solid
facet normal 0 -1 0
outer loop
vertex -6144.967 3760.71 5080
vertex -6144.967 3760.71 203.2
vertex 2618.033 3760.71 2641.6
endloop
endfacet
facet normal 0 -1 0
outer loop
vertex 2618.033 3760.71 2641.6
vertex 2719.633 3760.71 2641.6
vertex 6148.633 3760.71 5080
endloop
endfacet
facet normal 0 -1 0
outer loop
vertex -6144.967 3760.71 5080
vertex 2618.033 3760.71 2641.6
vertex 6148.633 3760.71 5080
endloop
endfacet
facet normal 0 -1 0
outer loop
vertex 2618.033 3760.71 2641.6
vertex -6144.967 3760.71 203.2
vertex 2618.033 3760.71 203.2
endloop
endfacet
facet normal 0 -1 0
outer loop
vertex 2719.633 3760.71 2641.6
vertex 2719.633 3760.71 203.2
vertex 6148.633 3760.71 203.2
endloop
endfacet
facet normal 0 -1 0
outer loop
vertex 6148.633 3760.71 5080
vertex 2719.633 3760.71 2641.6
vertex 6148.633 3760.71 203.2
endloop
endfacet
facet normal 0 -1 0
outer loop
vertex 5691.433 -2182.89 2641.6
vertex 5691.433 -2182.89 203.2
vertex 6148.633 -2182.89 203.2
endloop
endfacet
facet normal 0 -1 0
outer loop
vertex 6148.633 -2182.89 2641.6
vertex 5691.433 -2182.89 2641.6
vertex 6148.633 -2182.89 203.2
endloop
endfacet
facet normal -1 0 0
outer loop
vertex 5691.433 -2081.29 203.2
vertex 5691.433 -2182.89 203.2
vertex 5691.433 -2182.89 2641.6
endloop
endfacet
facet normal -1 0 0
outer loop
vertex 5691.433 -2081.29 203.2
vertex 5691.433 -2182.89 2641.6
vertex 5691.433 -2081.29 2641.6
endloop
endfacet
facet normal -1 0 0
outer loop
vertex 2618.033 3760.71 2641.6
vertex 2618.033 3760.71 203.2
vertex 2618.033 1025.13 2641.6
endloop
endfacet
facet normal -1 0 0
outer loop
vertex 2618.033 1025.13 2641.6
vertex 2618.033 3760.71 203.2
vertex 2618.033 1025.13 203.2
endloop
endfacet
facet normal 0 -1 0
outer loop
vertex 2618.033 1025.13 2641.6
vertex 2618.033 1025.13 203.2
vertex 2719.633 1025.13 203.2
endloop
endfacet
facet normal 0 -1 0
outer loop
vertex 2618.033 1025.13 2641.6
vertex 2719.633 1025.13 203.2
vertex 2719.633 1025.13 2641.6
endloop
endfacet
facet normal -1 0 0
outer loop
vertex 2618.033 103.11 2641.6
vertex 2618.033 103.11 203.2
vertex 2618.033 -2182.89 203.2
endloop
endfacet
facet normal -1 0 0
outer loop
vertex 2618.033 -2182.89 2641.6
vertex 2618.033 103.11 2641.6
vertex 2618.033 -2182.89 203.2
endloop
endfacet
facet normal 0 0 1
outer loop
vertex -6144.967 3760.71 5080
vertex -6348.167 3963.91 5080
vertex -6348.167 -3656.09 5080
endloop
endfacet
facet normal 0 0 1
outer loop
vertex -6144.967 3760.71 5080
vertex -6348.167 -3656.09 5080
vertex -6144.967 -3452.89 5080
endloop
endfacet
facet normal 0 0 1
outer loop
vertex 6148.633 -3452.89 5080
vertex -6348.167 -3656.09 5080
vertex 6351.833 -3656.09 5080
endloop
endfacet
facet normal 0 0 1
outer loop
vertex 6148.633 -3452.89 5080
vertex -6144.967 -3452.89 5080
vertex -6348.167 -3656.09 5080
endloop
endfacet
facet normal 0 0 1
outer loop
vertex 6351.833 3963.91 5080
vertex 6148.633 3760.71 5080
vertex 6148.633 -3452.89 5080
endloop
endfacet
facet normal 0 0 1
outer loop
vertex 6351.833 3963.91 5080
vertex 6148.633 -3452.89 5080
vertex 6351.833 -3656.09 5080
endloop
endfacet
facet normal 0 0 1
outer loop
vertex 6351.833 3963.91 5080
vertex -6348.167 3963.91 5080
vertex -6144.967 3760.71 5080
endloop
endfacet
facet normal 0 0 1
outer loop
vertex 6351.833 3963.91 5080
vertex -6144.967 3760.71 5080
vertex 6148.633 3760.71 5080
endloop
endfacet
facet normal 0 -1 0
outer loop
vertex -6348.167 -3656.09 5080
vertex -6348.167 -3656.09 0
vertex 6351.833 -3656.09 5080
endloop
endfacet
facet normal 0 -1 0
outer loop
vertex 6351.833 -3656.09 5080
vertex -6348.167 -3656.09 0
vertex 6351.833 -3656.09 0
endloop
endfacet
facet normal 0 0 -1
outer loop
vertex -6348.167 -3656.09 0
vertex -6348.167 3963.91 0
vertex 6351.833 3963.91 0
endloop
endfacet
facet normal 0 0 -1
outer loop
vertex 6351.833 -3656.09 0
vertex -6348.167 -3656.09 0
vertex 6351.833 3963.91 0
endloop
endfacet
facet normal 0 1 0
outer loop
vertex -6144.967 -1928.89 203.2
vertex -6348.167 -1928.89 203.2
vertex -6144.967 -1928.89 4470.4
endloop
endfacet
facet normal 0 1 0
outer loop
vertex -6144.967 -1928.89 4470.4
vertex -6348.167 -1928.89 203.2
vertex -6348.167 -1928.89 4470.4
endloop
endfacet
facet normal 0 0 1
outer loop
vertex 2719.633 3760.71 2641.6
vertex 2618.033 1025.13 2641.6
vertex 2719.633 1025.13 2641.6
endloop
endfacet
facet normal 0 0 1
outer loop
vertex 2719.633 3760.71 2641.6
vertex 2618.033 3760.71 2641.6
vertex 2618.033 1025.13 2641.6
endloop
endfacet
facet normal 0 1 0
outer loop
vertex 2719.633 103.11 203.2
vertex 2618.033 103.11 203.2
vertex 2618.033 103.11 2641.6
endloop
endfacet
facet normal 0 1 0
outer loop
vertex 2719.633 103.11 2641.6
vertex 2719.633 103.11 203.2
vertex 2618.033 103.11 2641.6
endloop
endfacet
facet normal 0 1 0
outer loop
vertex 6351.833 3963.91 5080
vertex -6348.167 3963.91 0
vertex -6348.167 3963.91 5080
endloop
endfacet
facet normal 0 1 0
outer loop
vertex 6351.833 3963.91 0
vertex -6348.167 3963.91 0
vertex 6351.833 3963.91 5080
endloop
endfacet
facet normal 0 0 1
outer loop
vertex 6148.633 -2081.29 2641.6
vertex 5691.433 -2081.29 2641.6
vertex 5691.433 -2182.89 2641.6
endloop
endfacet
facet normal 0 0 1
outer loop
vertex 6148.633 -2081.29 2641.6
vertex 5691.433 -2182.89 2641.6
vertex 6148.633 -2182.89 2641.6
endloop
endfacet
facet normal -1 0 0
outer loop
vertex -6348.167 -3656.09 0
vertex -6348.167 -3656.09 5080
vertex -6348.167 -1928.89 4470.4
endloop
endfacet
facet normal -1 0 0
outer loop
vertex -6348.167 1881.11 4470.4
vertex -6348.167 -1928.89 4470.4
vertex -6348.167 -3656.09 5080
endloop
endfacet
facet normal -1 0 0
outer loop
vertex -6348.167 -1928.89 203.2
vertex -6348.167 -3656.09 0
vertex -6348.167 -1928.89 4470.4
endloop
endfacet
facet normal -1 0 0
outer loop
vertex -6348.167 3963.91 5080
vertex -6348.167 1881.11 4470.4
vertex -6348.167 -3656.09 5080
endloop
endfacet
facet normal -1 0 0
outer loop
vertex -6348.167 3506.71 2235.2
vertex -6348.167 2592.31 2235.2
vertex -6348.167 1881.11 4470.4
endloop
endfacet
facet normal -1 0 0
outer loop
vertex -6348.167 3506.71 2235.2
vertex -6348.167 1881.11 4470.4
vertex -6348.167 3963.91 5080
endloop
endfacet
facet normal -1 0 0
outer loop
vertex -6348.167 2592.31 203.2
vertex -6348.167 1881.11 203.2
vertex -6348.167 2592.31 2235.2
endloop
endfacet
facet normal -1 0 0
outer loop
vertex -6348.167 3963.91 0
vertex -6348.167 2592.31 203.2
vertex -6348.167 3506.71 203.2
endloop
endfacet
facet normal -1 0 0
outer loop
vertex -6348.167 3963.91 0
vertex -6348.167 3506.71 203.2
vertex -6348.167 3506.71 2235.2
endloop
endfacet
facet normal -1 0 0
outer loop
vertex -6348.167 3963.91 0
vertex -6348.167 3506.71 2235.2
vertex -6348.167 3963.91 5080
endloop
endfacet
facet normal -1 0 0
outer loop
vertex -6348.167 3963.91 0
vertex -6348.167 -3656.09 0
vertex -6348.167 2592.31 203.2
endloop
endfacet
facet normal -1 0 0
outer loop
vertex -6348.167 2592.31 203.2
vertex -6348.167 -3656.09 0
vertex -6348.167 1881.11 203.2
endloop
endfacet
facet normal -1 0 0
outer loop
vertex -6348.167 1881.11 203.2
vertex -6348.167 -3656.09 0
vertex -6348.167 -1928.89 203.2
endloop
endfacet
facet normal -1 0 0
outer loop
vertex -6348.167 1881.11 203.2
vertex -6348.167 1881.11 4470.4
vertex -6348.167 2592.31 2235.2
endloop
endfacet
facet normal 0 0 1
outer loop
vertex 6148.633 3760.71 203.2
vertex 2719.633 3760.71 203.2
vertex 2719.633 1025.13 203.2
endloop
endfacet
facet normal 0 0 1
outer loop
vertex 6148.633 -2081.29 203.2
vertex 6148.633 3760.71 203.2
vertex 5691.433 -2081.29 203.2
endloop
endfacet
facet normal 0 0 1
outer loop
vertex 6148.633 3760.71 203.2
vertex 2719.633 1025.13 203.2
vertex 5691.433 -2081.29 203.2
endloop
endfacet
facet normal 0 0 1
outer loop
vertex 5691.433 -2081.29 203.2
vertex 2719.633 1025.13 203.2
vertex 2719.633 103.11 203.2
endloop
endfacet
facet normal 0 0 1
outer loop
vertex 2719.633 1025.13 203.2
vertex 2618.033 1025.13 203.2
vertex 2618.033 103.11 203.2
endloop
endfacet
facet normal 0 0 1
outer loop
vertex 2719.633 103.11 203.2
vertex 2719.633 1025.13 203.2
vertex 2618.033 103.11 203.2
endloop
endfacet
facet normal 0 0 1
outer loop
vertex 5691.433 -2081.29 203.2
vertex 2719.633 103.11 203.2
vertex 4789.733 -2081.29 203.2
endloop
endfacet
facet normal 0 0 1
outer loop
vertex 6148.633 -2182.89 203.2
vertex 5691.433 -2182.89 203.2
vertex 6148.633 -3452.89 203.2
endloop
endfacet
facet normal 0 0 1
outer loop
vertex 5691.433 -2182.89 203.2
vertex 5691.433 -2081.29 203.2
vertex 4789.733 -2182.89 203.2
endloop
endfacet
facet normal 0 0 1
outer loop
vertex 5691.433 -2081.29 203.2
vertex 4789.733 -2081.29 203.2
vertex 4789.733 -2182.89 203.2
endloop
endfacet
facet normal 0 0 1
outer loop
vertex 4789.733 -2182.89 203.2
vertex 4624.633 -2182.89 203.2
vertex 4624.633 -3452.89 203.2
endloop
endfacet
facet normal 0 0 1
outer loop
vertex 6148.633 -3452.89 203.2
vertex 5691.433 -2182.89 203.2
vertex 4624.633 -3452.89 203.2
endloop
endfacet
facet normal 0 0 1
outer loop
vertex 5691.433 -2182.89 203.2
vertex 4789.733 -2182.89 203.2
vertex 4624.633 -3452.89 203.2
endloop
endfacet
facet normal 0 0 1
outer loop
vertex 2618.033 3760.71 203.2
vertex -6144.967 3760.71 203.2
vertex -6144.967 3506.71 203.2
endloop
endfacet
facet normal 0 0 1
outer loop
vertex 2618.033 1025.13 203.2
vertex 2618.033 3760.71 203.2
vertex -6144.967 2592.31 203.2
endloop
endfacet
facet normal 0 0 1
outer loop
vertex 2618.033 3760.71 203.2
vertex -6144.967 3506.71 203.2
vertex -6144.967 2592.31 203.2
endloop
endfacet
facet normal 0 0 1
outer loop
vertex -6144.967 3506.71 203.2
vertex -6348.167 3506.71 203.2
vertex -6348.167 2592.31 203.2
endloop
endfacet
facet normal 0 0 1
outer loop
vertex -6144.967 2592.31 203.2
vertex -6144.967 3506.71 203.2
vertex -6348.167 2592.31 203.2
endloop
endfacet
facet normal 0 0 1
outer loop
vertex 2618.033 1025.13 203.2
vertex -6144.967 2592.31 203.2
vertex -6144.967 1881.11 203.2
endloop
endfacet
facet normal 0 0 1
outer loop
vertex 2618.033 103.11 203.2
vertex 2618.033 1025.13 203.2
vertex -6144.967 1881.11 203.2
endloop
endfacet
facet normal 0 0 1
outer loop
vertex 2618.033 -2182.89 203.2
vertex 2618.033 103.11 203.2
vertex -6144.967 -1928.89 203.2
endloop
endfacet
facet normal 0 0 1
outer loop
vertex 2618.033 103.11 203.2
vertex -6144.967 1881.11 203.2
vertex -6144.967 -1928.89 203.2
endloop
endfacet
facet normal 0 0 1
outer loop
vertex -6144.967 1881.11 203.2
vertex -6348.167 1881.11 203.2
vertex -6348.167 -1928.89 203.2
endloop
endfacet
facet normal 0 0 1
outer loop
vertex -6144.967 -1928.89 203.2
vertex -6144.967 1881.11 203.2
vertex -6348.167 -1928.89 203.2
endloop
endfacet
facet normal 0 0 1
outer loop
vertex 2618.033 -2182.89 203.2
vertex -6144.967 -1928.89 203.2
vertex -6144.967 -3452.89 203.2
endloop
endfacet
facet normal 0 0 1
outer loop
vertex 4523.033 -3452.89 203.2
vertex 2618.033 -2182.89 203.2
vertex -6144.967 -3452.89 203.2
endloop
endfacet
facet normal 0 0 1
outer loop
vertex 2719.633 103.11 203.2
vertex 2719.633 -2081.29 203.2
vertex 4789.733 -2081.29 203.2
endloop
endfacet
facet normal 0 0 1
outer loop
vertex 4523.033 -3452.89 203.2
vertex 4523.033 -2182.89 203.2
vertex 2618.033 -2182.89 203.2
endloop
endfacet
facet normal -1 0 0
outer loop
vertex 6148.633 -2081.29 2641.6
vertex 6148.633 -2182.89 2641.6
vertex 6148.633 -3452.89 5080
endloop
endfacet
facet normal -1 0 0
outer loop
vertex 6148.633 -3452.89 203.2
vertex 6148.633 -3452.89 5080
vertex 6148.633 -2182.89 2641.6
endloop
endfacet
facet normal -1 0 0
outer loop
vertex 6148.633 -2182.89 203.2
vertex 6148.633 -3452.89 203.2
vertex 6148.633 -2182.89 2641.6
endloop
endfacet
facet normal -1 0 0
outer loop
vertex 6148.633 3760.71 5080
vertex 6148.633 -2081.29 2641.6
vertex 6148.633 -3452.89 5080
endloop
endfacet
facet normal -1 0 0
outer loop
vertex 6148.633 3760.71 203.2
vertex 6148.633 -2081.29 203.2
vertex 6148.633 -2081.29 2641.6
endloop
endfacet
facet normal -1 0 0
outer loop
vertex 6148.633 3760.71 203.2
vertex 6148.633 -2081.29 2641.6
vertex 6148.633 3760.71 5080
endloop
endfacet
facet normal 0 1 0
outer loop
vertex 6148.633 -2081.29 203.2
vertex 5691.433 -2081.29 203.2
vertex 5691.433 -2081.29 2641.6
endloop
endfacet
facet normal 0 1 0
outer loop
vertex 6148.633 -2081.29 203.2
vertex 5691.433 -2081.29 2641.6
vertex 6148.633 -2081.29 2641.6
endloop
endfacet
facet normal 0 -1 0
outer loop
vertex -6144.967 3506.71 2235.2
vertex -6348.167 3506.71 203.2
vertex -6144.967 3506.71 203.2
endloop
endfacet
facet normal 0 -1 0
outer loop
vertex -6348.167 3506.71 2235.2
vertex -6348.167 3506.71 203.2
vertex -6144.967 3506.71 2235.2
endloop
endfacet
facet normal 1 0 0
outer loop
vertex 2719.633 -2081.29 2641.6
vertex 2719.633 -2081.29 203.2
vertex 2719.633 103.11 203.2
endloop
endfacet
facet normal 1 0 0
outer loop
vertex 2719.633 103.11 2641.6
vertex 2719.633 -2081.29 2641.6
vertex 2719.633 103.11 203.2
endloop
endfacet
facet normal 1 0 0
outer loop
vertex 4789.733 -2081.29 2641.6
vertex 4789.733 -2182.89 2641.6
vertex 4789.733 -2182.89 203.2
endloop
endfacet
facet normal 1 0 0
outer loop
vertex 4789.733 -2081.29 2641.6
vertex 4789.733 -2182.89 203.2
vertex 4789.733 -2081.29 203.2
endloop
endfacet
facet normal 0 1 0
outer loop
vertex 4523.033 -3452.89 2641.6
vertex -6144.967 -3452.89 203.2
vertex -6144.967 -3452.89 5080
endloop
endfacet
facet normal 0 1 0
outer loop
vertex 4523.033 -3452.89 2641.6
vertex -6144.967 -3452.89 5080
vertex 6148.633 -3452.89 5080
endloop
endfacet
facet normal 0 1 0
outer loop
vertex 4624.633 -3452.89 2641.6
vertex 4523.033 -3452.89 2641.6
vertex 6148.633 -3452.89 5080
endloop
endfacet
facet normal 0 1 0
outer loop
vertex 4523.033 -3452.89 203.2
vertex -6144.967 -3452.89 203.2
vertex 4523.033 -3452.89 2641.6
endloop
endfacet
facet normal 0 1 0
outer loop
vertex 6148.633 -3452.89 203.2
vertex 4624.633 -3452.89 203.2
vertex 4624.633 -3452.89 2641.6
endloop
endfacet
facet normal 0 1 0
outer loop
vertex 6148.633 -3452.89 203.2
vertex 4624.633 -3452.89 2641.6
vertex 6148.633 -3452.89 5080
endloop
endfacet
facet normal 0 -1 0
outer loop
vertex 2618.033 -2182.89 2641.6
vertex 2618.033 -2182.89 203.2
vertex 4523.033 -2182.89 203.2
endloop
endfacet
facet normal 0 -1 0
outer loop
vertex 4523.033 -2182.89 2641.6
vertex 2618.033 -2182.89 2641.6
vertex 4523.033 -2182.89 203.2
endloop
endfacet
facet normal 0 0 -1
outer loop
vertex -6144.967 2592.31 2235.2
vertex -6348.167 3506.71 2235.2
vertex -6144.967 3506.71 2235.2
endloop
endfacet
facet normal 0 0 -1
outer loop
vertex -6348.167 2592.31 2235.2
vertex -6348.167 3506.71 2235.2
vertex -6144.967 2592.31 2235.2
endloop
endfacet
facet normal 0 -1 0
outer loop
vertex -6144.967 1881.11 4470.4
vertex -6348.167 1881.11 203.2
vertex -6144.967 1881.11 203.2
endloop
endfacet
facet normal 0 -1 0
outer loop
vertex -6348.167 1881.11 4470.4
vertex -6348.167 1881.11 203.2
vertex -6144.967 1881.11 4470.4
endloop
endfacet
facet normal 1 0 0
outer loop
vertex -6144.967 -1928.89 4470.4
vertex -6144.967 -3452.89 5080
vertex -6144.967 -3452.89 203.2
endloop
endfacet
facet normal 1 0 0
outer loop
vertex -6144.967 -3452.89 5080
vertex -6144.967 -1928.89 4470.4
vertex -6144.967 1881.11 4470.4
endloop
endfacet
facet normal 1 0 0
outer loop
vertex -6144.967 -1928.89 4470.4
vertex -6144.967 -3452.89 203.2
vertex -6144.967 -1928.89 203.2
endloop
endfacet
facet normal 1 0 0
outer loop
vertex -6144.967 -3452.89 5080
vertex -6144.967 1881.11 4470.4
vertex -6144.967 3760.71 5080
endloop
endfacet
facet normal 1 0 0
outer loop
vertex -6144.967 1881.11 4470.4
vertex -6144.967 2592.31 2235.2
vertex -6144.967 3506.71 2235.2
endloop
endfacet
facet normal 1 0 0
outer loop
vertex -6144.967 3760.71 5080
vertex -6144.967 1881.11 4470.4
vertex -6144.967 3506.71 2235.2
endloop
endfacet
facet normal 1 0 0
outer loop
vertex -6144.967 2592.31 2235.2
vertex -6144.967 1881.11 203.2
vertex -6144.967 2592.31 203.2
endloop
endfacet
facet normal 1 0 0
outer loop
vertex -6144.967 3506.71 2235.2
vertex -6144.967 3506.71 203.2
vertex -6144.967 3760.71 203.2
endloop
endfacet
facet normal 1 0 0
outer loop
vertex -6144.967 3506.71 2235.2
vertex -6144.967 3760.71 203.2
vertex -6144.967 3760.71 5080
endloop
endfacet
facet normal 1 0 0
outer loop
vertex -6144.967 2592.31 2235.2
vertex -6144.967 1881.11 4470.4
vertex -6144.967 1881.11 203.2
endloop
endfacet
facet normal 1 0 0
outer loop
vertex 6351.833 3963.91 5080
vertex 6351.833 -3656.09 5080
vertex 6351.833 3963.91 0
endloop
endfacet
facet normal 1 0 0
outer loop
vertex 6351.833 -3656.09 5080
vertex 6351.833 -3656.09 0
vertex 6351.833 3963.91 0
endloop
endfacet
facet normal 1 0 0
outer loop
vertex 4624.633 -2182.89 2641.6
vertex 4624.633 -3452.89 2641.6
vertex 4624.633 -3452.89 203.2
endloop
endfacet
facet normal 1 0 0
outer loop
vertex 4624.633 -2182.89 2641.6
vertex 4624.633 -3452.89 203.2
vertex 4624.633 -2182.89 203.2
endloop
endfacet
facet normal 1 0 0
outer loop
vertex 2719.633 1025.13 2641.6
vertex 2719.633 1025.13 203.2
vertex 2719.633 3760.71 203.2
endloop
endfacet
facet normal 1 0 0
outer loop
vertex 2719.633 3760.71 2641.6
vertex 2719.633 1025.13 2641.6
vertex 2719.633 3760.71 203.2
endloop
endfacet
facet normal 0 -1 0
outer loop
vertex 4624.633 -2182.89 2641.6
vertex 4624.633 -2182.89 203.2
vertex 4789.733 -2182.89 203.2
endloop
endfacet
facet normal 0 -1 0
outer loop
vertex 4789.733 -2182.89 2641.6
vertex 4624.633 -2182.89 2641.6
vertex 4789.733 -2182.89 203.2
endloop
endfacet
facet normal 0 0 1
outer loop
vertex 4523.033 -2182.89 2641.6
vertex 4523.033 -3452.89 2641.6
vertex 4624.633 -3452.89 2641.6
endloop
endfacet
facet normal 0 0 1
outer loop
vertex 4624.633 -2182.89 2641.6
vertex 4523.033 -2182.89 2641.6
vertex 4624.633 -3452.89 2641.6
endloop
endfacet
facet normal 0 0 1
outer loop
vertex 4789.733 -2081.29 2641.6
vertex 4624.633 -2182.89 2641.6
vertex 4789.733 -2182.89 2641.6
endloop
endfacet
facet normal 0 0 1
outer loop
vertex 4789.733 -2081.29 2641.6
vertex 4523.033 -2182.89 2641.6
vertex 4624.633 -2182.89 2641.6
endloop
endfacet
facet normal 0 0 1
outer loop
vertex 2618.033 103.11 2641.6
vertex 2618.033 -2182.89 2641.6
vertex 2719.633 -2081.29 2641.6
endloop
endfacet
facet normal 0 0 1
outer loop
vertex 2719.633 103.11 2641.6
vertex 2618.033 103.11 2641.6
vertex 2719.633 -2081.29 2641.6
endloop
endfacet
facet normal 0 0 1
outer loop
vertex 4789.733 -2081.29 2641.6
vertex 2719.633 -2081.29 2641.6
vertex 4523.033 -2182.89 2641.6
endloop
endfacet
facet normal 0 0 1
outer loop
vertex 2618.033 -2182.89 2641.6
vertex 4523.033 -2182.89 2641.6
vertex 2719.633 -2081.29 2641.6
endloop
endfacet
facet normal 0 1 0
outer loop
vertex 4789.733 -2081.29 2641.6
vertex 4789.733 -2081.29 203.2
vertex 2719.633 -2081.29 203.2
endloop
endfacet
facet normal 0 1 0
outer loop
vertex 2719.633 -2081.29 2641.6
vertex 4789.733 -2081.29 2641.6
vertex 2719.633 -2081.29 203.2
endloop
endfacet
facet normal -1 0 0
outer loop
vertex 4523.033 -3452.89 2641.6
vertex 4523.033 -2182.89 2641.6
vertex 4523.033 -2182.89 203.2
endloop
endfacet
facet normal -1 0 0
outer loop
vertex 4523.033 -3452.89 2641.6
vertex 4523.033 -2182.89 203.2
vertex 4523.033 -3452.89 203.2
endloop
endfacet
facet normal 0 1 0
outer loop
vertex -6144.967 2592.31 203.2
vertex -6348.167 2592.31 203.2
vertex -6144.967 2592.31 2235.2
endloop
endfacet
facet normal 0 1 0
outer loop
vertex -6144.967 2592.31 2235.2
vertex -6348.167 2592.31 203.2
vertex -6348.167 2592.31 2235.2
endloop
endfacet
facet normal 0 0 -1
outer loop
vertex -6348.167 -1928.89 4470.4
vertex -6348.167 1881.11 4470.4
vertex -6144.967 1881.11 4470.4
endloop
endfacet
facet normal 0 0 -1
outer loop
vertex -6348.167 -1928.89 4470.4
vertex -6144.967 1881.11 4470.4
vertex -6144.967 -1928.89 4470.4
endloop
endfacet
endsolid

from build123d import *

# Parameters (mm, degrees)
F3_W      = 12700
F3_H      = 7620
F4_DEPTH  = 203.2
F5_W      = 12700
F5_H      = 7620
F5_W_2    = 12293.6
F5_H_2    = 7213.6
F6_DEPTH  = 4876.8
F7_W      = 3810
F7_H      = 4267.2
F7_W_2    = 914.4
F7_H_2    = 2032
F8_DEPTH  = 203.2
F9_W      = 457.2
F9_H      = 101.6
F10_DEPTH = 2438.4
F11_W     = 922.02
F11_H     = 2438.4
F12_DEPTH = 101.6


# Not quite as in the source:
# - a variable given as a bare number and used for a length is read in inches; the dataset says mm whatever the document's units were


with BuildPart() as f4:
    # F3 (on Top) → F4 (new body)
    with BuildSketch(Plane.XY):
        with Locations((1.8329881132, 153.9102016476)):
            Rectangle(F3_W, F3_H)
    extrude(amount=F4_DEPTH)

    # F5 (on face) → F6 (join)
    with BuildSketch(Plane.XY.offset(203.2)):
        with Locations((1.8329881132, 153.9102016476)):
            Rectangle(F5_W, F5_H)
        with Locations((1.8329881132, 153.9102016476)):
            Rectangle(F5_W_2, F5_H_2, mode=Mode.SUBTRACT)
    extrude(amount=F6_DEPTH)

    # F7 (on face) → F8 (cut, through all)
    with BuildSketch(Plane(origin=(-6348.1670118868, 0, 0), x_dir=(0, -1, 0), z_dir=(-1, 0, 0))):
        with Locations((23.8897983524, 2336.8)):
            Rectangle(F7_W, F7_H)
        with Locations((-3049.5102016476, 1219.2)):
            Rectangle(F7_W_2, F7_H_2)
    extrude(amount=-F8_DEPTH, mode=Mode.SUBTRACT)

    # F9 (on face) → F10 (join)
    with BuildSketch(Plane.XY.offset(203.2)):
        Polygon((2719.6329881132, -2081.2897983524), (2719.6329881132, 3760.7102016476), (2618.0329881132, 3760.7102016476), (2618.0329881132, -2182.8897983524), (4523.0329881132, -2182.8897983524), (4523.0329881132, -3452.8897983524), (4624.6329881132, -3452.8897983524), (4624.6329881132, -2182.8897983524), (4789.7329881132, -2182.8897983524), (4789.7329881132, -2081.2897983524), (4624.6329881132, -2081.2897983524), align=None)
        with Locations((5920.0329881132, -2132.0897983524)):
            Rectangle(F9_W, F9_H)
    extrude(amount=F10_DEPTH)

    # F11 (on face) → F12 (cut, through all)
    with BuildSketch(Plane(origin=(2618.0329881132, 0, 0), x_dir=(0, -1, 0), z_dir=(-1, 0, 0))):
        with Locations((-564.1202016476, 1422.4)):
            Rectangle(F11_W, F11_H)
    extrude(amount=-F12_DEPTH, mode=Mode.SUBTRACT)


solid = f4.part
